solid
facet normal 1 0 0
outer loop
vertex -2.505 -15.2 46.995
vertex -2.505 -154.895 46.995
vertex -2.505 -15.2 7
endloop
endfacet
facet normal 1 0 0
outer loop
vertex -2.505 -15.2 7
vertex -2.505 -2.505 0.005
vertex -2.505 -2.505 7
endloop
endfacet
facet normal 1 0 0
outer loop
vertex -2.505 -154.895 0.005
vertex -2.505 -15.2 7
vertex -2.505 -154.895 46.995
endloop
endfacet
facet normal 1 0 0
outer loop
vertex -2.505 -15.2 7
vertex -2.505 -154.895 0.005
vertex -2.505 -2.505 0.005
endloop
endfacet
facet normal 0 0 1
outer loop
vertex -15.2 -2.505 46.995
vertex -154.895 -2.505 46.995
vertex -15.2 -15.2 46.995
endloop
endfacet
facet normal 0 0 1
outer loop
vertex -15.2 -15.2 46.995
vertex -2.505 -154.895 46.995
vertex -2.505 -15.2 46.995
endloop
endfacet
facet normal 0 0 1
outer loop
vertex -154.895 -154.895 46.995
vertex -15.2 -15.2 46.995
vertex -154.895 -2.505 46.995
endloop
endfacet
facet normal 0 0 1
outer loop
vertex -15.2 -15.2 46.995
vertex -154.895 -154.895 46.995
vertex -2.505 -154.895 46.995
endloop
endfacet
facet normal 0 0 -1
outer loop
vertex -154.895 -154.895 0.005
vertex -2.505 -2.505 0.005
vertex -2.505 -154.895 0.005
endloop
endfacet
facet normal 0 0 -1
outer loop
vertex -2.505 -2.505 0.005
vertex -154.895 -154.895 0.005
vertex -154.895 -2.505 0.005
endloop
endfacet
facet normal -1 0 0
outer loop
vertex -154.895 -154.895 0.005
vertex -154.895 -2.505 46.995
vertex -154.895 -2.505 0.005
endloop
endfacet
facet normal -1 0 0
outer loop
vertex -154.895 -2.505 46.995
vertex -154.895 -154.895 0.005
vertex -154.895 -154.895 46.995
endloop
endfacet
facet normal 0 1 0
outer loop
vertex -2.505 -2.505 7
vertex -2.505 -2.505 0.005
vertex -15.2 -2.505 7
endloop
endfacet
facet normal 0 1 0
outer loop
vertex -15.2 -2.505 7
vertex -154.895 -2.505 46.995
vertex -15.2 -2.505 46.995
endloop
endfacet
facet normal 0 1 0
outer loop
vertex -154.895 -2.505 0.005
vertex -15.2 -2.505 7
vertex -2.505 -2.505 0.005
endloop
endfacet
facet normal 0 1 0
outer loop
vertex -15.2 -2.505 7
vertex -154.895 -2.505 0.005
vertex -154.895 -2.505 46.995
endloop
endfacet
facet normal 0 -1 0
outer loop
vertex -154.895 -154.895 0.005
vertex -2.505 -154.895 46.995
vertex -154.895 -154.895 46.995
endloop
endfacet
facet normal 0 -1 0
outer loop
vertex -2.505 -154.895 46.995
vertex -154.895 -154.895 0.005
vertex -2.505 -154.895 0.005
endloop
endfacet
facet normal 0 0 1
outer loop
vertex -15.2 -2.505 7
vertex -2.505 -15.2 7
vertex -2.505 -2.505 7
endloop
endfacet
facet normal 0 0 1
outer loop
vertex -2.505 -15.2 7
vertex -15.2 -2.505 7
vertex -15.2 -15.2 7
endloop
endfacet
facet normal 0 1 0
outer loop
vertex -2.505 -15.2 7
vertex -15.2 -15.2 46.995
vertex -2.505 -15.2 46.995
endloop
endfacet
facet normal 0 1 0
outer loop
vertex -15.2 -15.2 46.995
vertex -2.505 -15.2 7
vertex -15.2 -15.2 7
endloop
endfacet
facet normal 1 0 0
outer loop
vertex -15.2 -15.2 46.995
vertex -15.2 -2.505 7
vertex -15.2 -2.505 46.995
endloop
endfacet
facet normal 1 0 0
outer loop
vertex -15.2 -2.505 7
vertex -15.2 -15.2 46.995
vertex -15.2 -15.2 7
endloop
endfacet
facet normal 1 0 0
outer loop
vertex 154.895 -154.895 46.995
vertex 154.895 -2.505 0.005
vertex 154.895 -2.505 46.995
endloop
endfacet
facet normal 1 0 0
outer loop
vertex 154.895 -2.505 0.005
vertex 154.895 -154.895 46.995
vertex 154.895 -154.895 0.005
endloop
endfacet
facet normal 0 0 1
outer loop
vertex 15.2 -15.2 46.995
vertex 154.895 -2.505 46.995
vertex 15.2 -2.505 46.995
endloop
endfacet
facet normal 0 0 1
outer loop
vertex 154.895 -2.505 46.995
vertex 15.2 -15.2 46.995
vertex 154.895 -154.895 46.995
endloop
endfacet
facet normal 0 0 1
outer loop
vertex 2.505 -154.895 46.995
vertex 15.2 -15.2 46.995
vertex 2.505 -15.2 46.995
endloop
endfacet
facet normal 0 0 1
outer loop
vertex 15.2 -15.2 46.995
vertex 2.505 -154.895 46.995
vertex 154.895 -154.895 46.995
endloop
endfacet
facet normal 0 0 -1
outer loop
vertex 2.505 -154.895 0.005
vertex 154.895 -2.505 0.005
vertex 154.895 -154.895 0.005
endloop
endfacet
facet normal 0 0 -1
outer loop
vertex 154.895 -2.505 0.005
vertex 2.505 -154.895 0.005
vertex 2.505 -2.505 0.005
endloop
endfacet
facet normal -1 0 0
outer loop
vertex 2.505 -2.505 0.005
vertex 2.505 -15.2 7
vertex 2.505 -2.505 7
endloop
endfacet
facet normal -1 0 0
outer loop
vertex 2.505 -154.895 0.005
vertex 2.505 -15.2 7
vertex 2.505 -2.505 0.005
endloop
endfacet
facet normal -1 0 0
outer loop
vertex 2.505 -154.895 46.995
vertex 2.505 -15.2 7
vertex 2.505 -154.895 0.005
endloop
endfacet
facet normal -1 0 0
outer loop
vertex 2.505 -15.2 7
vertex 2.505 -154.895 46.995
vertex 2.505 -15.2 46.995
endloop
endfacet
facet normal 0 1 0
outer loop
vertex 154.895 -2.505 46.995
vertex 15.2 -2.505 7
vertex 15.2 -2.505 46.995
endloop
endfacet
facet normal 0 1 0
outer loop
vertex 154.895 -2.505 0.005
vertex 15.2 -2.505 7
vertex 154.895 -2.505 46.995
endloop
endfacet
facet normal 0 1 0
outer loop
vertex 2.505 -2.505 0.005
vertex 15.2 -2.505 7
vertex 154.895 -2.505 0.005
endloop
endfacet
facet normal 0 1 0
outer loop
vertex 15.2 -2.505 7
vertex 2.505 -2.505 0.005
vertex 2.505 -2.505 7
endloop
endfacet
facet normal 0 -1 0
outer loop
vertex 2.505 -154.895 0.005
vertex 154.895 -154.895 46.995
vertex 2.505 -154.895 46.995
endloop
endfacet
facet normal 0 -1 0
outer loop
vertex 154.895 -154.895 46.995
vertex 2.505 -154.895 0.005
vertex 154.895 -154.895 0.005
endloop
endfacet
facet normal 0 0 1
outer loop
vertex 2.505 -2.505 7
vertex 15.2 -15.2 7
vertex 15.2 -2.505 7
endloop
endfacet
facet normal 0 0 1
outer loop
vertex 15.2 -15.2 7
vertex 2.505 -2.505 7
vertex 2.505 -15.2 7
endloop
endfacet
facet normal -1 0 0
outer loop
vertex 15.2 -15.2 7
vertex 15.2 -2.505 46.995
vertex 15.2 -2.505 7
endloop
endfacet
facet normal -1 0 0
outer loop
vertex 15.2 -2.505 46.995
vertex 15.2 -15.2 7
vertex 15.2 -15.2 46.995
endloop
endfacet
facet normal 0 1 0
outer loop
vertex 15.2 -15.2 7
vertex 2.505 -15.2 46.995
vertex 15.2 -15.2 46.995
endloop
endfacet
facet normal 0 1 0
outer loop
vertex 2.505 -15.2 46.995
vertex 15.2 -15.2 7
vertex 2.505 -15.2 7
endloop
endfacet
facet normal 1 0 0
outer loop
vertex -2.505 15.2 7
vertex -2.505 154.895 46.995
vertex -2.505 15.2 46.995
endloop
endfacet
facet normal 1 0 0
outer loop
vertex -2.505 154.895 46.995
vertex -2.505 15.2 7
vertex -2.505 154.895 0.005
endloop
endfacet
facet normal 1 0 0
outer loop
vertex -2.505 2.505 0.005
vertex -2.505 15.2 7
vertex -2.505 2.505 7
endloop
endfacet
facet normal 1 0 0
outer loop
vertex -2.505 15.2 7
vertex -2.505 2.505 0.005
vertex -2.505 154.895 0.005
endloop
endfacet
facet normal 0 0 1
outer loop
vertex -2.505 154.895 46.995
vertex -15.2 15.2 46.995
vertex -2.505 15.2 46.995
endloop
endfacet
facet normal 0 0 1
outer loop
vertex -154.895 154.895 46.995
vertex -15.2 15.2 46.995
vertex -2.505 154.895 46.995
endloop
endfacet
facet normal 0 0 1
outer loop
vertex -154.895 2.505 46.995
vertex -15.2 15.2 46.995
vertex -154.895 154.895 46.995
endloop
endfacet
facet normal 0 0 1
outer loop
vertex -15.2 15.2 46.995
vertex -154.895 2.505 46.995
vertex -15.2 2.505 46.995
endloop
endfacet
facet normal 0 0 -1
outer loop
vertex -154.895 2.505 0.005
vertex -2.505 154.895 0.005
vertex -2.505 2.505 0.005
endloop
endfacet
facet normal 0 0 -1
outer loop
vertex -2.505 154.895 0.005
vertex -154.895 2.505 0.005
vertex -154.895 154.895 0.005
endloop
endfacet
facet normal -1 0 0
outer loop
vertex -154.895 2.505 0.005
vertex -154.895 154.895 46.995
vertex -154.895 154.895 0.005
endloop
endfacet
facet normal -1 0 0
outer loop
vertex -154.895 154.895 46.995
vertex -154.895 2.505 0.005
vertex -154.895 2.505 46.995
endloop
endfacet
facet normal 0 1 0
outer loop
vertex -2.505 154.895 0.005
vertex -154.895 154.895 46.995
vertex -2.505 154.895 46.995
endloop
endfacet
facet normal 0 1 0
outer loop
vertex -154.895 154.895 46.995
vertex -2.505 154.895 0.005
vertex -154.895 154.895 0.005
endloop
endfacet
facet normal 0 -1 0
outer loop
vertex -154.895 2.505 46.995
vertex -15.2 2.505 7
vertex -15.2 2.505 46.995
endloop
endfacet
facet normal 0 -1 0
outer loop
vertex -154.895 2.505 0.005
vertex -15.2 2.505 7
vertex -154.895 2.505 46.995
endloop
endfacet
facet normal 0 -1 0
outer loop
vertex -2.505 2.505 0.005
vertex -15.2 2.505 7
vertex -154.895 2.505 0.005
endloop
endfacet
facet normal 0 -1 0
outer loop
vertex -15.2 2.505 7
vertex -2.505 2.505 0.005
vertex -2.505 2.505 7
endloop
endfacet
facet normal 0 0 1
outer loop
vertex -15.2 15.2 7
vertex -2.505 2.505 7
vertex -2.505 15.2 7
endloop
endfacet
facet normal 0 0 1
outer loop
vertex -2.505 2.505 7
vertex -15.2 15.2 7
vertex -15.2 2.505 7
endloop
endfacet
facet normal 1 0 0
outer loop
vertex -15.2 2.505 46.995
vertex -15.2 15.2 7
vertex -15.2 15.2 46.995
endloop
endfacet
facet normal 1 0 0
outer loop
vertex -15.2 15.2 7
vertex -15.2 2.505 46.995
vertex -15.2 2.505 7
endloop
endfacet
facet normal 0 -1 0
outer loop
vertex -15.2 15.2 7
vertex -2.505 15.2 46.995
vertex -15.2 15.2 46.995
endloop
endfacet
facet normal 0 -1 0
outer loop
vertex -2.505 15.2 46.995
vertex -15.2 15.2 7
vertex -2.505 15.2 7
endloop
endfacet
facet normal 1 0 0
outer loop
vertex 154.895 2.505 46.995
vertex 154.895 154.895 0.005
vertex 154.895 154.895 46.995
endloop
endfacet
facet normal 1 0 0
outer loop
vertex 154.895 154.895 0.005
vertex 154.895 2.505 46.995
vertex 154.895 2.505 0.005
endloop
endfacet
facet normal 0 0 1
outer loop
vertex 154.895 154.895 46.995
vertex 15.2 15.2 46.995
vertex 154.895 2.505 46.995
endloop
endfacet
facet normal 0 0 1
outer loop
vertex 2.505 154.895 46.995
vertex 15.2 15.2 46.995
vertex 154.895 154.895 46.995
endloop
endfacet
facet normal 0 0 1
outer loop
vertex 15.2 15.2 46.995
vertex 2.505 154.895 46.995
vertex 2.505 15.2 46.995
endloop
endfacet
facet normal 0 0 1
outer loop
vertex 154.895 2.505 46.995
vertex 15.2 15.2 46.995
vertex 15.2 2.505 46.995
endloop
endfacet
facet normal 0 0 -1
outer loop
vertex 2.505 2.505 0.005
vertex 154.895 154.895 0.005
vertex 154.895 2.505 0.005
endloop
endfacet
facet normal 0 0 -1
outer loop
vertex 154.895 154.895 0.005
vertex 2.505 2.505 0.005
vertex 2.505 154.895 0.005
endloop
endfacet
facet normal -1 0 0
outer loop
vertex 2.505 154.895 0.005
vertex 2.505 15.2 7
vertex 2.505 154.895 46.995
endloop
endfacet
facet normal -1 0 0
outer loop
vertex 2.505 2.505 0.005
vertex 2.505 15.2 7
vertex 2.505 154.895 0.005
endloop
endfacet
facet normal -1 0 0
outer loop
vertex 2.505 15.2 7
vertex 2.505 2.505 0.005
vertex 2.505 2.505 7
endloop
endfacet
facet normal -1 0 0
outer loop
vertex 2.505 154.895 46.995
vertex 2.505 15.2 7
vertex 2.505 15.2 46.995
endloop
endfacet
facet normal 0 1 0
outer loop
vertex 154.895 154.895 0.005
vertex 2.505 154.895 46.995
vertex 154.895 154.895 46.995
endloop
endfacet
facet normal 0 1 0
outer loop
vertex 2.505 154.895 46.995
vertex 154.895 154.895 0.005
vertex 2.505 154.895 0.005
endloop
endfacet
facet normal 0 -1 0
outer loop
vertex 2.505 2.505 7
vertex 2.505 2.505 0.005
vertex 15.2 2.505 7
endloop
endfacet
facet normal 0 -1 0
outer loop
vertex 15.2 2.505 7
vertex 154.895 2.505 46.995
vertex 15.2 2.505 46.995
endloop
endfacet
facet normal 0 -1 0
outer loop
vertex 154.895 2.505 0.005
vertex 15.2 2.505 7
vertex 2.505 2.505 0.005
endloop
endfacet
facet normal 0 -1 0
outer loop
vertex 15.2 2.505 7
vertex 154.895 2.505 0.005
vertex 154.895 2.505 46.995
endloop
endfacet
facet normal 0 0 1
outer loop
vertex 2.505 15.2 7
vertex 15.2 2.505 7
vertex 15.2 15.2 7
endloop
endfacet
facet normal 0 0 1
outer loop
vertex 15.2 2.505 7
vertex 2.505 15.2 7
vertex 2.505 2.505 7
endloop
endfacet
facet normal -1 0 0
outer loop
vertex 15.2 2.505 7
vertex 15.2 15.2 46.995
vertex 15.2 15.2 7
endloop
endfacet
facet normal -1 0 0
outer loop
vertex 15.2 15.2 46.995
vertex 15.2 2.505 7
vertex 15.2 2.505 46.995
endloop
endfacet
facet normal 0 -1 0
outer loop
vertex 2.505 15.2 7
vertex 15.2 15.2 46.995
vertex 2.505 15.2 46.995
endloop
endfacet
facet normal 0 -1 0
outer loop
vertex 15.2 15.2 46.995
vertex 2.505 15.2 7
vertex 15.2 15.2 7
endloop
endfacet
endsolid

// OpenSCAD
// file: openlock_port.scad
include <consts.scad>

module port() {
    // all units are in mm (yes, this is a *special* case for this project)
    depth = 4;
    width = 9.75;
    collar_width = 1.8545;
    collar_indent = 1;
    height = 13.2;
    notch_width = 5.8445;
    notch_height = 9.80;
    notch_offset = (height - notch_height) / 2;
    notch_rest = 1;
    // offset hack - adds tolerance for preview/render
    eps = 0.01;
    eps_half = eps / 2;
    
    translate([0, -height / 2, -depth / 2])
        difference() {
            translate([0, eps_half, eps_half])
                cube([width, height - eps, depth - eps]);
            linear_extrude(depth)
                polygon([
                    [collar_width, 0],
                    [collar_width, collar_indent],
                    [notch_width - notch_rest, notch_offset],
                    [notch_width, notch_offset],
                    [notch_width, 0]
                ]);
            linear_extrude(depth)
                polygon([
                    [collar_width, height],
                    [collar_width, height - collar_indent],
                    [notch_width - notch_rest, height - notch_offset],
                    [notch_width, height - notch_offset],
                    [notch_width, height]
                ]);
        }
}

// yeah... units are in inches, unless suffixed with `_mm`...
module openlock_rectangle(width, height, extrude_mm, sparse=false) {
    width_mm = inches_to_mm(width);
    height_mm = inches_to_mm(height);
    full_inch_mm = inches_to_mm(1);
    half_inch_mm = inches_to_mm(0.5);
    spacing = sparse ? full_inch_mm : half_inch_mm;
    // offset hack - adds tolerance for preview/render
    eps = 0.01;
    eps_half = eps / 2;

    difference() {
        translate([-width_mm / 2 + eps_half, -height_mm / 2 + eps_half, 0]) {
            cube([
                width_mm - eps,
                height_mm - eps,
                openlock_edge_extrude_mm + extrude_mm - eps
            ]);
        }

        // x
        for(angle = [90, 270]) {
            for(offset = [spacing : spacing: width_mm - half_inch_mm]) {
                rotate(angle)
                translate([-height_mm / 2, -width_mm / 2 + offset, openlock_edge_extrude_mid_mm]) {
                    port();
                }
            }
        }
        
        // y
        for(angle = [0, 180]) {
            for(offset = [spacing : spacing : height_mm - half_inch_mm]) {
                rotate(angle)
                translate([-width_mm / 2, -height_mm / 2 + offset, openlock_edge_extrude_mid_mm]) {
                    port();
                }
            }
        }
    }
}

module openlock_square(width, extrude_mm, sparse=false) {
    openlock_rectangle(width, width, extrude_mm, sparse);
}

// test
//port();
// file: trench_template.scad
include <consts.scad>
use <openlock_port.scad>

module template_base(system=system_openlock) {
    difference() {
        if(system==system_openlock)
            openlock_square(template_width, trench_height_mm);
        if(system==system_openlock_sparse)
            openlock_square(template_width, trench_height_mm, true);
        
        translate([0, 0, openlock_edge_extrude_mm])
            linear_extrude(trench_height_mm)
                children();
    }
}

module center_template() {
    template_width_half_mm = template_width_mm / 2;
    
    translate([-template_width_half_mm, -template_width_half_mm, 0])
        children();
}

module center_polygon(points) {
    center_template()
        polygon(points * mm_in_inch);
}

module center_polygon_grid(points, coords) {
    translate([
        -coords[0] * template_width_mm,
        -coords[1] * template_width_mm
    ])
        center_polygon(points);
}

module template_polygon_grid(points, coords, system=system_openlock) {
    template_base(system)
        center_polygon_grid(points, coords);
}

module template_polygon(points, system) {
    template_polygon_grid(points, [0, 0], system);
}

module indent() {
    edge_offset = (template_width - trench_width) / 2;
    
    center_polygon([
        [edge_offset, 0],
        [template_width - edge_offset, 0],
        [template_width - edge_offset, template_width - edge_offset],
        [edge_offset, template_width - edge_offset],
    ]);
}

module template_indents(angles, system=system_openlock) {
    template_base(system)
        for(angle = angles)
            rotate(angle)
                indent();
}

// test
template_base();
// file: consts.scad
mm_in_inch = 25.399999619;

function inches_to_mm(inches) = mm_in_inch * inches;
function mm_to_inches(mm) = mm / mm_in_inch;

// yeah... units are in inches, unless suffixed with `_mm`...
trench_width = 2.5;
template_width = 6;

trench_height_mm = 40;

template_width_mm = inches_to_mm(template_width);

// measured some of the official terrain, but not all of them - might need to adjust it...
30_deg_in_width_mm = 17;
30_deg_out_width_mm = 15.20;
60_deg_in_width_mm = 18.10;
60_deg_out_width_mm = 27.10;

openlock_edge_extrude_mm = 7;
openlock_edge_extrude_mid_mm = openlock_edge_extrude_mm / 2;

system_openlock = "openlock";
system_openlock_sparse = "openlock_sparse";
// main file
include <consts.scad>
use <trench_template.scad>
use <openlock_port.scad>

module explode_geometry(x, y, trench_definition) {
    // offset hack - adds tolerance for preview/render
    eps = 0.01;
    eps_half = eps / 2;
    // copy pasted `template_base`'s code to get rid of openlock system - simplifies geometry *a lot*
    difference() {
        translate([
            -template_width_mm / 2 + eps_half,
            -template_width_mm / 2 + eps_half,
            eps_half
        ])
            cube([
                template_width_mm - eps,
                template_width_mm - eps,
                trench_height_mm + openlock_edge_extrude_mm - eps
            ]);
        
        translate([0, 0, openlock_edge_extrude_mm])
            linear_extrude(trench_height_mm)
                center_polygon_grid(trench_definition, [x, y]);
    }
}

module explode_preview(group_width, group_height, explode_gap_mm, trench_definition, selection) {
    group_width_half = group_width / 2;
    group_height_half = group_height / 2;
    for(iter_y = [1 : 1 : group_height]) {
        for(iter_x = [1 : 1 : group_width]) {
            x = iter_x - 1;
            y = iter_y - 1;
            gap_offset_x = ((x + 0.5 - group_width_half) / 2) * explode_gap_mm;
            gap_offset_y = ((y + 0.5 - group_width_half) / 2) * explode_gap_mm;
            translate([
                template_width_mm * (x - group_width_half + 0.5) + gap_offset_x,
                template_width_mm * (y - group_height_half + 0.5) + gap_offset_y,
                0
            ]) {
                if(selection[0] == x && selection[1] == y)
                    #explode_geometry(x, y, trench_definition);
                else
                    explode_geometry(x, y, trench_definition);
            }
        }
    }
}

// TODO: get rid of magic numbers
module openlock_port_magnet_jig() {
    difference() {
        eps = 0.01;
        box_size = 16;
        translate([eps, -box_size / 2, 0])
            cube([box_size, box_size, trench_height_mm + openlock_edge_extrude_mm]);
        translate([0, 0, openlock_edge_extrude_mid_mm])
            port();
    }
}

// test
trench_definition_test = [
    [5.5, 5.5],
    [5.5, 6.5],
    [6.5, 6.5],
    [6.5, 5.5],
];

//template_polygon_grid(trench_definition_test, [0, 0]);
explode_preview(2, 2, 10, trench_definition_test, [0, 0]);

//openlock_port_magnet_jig();
